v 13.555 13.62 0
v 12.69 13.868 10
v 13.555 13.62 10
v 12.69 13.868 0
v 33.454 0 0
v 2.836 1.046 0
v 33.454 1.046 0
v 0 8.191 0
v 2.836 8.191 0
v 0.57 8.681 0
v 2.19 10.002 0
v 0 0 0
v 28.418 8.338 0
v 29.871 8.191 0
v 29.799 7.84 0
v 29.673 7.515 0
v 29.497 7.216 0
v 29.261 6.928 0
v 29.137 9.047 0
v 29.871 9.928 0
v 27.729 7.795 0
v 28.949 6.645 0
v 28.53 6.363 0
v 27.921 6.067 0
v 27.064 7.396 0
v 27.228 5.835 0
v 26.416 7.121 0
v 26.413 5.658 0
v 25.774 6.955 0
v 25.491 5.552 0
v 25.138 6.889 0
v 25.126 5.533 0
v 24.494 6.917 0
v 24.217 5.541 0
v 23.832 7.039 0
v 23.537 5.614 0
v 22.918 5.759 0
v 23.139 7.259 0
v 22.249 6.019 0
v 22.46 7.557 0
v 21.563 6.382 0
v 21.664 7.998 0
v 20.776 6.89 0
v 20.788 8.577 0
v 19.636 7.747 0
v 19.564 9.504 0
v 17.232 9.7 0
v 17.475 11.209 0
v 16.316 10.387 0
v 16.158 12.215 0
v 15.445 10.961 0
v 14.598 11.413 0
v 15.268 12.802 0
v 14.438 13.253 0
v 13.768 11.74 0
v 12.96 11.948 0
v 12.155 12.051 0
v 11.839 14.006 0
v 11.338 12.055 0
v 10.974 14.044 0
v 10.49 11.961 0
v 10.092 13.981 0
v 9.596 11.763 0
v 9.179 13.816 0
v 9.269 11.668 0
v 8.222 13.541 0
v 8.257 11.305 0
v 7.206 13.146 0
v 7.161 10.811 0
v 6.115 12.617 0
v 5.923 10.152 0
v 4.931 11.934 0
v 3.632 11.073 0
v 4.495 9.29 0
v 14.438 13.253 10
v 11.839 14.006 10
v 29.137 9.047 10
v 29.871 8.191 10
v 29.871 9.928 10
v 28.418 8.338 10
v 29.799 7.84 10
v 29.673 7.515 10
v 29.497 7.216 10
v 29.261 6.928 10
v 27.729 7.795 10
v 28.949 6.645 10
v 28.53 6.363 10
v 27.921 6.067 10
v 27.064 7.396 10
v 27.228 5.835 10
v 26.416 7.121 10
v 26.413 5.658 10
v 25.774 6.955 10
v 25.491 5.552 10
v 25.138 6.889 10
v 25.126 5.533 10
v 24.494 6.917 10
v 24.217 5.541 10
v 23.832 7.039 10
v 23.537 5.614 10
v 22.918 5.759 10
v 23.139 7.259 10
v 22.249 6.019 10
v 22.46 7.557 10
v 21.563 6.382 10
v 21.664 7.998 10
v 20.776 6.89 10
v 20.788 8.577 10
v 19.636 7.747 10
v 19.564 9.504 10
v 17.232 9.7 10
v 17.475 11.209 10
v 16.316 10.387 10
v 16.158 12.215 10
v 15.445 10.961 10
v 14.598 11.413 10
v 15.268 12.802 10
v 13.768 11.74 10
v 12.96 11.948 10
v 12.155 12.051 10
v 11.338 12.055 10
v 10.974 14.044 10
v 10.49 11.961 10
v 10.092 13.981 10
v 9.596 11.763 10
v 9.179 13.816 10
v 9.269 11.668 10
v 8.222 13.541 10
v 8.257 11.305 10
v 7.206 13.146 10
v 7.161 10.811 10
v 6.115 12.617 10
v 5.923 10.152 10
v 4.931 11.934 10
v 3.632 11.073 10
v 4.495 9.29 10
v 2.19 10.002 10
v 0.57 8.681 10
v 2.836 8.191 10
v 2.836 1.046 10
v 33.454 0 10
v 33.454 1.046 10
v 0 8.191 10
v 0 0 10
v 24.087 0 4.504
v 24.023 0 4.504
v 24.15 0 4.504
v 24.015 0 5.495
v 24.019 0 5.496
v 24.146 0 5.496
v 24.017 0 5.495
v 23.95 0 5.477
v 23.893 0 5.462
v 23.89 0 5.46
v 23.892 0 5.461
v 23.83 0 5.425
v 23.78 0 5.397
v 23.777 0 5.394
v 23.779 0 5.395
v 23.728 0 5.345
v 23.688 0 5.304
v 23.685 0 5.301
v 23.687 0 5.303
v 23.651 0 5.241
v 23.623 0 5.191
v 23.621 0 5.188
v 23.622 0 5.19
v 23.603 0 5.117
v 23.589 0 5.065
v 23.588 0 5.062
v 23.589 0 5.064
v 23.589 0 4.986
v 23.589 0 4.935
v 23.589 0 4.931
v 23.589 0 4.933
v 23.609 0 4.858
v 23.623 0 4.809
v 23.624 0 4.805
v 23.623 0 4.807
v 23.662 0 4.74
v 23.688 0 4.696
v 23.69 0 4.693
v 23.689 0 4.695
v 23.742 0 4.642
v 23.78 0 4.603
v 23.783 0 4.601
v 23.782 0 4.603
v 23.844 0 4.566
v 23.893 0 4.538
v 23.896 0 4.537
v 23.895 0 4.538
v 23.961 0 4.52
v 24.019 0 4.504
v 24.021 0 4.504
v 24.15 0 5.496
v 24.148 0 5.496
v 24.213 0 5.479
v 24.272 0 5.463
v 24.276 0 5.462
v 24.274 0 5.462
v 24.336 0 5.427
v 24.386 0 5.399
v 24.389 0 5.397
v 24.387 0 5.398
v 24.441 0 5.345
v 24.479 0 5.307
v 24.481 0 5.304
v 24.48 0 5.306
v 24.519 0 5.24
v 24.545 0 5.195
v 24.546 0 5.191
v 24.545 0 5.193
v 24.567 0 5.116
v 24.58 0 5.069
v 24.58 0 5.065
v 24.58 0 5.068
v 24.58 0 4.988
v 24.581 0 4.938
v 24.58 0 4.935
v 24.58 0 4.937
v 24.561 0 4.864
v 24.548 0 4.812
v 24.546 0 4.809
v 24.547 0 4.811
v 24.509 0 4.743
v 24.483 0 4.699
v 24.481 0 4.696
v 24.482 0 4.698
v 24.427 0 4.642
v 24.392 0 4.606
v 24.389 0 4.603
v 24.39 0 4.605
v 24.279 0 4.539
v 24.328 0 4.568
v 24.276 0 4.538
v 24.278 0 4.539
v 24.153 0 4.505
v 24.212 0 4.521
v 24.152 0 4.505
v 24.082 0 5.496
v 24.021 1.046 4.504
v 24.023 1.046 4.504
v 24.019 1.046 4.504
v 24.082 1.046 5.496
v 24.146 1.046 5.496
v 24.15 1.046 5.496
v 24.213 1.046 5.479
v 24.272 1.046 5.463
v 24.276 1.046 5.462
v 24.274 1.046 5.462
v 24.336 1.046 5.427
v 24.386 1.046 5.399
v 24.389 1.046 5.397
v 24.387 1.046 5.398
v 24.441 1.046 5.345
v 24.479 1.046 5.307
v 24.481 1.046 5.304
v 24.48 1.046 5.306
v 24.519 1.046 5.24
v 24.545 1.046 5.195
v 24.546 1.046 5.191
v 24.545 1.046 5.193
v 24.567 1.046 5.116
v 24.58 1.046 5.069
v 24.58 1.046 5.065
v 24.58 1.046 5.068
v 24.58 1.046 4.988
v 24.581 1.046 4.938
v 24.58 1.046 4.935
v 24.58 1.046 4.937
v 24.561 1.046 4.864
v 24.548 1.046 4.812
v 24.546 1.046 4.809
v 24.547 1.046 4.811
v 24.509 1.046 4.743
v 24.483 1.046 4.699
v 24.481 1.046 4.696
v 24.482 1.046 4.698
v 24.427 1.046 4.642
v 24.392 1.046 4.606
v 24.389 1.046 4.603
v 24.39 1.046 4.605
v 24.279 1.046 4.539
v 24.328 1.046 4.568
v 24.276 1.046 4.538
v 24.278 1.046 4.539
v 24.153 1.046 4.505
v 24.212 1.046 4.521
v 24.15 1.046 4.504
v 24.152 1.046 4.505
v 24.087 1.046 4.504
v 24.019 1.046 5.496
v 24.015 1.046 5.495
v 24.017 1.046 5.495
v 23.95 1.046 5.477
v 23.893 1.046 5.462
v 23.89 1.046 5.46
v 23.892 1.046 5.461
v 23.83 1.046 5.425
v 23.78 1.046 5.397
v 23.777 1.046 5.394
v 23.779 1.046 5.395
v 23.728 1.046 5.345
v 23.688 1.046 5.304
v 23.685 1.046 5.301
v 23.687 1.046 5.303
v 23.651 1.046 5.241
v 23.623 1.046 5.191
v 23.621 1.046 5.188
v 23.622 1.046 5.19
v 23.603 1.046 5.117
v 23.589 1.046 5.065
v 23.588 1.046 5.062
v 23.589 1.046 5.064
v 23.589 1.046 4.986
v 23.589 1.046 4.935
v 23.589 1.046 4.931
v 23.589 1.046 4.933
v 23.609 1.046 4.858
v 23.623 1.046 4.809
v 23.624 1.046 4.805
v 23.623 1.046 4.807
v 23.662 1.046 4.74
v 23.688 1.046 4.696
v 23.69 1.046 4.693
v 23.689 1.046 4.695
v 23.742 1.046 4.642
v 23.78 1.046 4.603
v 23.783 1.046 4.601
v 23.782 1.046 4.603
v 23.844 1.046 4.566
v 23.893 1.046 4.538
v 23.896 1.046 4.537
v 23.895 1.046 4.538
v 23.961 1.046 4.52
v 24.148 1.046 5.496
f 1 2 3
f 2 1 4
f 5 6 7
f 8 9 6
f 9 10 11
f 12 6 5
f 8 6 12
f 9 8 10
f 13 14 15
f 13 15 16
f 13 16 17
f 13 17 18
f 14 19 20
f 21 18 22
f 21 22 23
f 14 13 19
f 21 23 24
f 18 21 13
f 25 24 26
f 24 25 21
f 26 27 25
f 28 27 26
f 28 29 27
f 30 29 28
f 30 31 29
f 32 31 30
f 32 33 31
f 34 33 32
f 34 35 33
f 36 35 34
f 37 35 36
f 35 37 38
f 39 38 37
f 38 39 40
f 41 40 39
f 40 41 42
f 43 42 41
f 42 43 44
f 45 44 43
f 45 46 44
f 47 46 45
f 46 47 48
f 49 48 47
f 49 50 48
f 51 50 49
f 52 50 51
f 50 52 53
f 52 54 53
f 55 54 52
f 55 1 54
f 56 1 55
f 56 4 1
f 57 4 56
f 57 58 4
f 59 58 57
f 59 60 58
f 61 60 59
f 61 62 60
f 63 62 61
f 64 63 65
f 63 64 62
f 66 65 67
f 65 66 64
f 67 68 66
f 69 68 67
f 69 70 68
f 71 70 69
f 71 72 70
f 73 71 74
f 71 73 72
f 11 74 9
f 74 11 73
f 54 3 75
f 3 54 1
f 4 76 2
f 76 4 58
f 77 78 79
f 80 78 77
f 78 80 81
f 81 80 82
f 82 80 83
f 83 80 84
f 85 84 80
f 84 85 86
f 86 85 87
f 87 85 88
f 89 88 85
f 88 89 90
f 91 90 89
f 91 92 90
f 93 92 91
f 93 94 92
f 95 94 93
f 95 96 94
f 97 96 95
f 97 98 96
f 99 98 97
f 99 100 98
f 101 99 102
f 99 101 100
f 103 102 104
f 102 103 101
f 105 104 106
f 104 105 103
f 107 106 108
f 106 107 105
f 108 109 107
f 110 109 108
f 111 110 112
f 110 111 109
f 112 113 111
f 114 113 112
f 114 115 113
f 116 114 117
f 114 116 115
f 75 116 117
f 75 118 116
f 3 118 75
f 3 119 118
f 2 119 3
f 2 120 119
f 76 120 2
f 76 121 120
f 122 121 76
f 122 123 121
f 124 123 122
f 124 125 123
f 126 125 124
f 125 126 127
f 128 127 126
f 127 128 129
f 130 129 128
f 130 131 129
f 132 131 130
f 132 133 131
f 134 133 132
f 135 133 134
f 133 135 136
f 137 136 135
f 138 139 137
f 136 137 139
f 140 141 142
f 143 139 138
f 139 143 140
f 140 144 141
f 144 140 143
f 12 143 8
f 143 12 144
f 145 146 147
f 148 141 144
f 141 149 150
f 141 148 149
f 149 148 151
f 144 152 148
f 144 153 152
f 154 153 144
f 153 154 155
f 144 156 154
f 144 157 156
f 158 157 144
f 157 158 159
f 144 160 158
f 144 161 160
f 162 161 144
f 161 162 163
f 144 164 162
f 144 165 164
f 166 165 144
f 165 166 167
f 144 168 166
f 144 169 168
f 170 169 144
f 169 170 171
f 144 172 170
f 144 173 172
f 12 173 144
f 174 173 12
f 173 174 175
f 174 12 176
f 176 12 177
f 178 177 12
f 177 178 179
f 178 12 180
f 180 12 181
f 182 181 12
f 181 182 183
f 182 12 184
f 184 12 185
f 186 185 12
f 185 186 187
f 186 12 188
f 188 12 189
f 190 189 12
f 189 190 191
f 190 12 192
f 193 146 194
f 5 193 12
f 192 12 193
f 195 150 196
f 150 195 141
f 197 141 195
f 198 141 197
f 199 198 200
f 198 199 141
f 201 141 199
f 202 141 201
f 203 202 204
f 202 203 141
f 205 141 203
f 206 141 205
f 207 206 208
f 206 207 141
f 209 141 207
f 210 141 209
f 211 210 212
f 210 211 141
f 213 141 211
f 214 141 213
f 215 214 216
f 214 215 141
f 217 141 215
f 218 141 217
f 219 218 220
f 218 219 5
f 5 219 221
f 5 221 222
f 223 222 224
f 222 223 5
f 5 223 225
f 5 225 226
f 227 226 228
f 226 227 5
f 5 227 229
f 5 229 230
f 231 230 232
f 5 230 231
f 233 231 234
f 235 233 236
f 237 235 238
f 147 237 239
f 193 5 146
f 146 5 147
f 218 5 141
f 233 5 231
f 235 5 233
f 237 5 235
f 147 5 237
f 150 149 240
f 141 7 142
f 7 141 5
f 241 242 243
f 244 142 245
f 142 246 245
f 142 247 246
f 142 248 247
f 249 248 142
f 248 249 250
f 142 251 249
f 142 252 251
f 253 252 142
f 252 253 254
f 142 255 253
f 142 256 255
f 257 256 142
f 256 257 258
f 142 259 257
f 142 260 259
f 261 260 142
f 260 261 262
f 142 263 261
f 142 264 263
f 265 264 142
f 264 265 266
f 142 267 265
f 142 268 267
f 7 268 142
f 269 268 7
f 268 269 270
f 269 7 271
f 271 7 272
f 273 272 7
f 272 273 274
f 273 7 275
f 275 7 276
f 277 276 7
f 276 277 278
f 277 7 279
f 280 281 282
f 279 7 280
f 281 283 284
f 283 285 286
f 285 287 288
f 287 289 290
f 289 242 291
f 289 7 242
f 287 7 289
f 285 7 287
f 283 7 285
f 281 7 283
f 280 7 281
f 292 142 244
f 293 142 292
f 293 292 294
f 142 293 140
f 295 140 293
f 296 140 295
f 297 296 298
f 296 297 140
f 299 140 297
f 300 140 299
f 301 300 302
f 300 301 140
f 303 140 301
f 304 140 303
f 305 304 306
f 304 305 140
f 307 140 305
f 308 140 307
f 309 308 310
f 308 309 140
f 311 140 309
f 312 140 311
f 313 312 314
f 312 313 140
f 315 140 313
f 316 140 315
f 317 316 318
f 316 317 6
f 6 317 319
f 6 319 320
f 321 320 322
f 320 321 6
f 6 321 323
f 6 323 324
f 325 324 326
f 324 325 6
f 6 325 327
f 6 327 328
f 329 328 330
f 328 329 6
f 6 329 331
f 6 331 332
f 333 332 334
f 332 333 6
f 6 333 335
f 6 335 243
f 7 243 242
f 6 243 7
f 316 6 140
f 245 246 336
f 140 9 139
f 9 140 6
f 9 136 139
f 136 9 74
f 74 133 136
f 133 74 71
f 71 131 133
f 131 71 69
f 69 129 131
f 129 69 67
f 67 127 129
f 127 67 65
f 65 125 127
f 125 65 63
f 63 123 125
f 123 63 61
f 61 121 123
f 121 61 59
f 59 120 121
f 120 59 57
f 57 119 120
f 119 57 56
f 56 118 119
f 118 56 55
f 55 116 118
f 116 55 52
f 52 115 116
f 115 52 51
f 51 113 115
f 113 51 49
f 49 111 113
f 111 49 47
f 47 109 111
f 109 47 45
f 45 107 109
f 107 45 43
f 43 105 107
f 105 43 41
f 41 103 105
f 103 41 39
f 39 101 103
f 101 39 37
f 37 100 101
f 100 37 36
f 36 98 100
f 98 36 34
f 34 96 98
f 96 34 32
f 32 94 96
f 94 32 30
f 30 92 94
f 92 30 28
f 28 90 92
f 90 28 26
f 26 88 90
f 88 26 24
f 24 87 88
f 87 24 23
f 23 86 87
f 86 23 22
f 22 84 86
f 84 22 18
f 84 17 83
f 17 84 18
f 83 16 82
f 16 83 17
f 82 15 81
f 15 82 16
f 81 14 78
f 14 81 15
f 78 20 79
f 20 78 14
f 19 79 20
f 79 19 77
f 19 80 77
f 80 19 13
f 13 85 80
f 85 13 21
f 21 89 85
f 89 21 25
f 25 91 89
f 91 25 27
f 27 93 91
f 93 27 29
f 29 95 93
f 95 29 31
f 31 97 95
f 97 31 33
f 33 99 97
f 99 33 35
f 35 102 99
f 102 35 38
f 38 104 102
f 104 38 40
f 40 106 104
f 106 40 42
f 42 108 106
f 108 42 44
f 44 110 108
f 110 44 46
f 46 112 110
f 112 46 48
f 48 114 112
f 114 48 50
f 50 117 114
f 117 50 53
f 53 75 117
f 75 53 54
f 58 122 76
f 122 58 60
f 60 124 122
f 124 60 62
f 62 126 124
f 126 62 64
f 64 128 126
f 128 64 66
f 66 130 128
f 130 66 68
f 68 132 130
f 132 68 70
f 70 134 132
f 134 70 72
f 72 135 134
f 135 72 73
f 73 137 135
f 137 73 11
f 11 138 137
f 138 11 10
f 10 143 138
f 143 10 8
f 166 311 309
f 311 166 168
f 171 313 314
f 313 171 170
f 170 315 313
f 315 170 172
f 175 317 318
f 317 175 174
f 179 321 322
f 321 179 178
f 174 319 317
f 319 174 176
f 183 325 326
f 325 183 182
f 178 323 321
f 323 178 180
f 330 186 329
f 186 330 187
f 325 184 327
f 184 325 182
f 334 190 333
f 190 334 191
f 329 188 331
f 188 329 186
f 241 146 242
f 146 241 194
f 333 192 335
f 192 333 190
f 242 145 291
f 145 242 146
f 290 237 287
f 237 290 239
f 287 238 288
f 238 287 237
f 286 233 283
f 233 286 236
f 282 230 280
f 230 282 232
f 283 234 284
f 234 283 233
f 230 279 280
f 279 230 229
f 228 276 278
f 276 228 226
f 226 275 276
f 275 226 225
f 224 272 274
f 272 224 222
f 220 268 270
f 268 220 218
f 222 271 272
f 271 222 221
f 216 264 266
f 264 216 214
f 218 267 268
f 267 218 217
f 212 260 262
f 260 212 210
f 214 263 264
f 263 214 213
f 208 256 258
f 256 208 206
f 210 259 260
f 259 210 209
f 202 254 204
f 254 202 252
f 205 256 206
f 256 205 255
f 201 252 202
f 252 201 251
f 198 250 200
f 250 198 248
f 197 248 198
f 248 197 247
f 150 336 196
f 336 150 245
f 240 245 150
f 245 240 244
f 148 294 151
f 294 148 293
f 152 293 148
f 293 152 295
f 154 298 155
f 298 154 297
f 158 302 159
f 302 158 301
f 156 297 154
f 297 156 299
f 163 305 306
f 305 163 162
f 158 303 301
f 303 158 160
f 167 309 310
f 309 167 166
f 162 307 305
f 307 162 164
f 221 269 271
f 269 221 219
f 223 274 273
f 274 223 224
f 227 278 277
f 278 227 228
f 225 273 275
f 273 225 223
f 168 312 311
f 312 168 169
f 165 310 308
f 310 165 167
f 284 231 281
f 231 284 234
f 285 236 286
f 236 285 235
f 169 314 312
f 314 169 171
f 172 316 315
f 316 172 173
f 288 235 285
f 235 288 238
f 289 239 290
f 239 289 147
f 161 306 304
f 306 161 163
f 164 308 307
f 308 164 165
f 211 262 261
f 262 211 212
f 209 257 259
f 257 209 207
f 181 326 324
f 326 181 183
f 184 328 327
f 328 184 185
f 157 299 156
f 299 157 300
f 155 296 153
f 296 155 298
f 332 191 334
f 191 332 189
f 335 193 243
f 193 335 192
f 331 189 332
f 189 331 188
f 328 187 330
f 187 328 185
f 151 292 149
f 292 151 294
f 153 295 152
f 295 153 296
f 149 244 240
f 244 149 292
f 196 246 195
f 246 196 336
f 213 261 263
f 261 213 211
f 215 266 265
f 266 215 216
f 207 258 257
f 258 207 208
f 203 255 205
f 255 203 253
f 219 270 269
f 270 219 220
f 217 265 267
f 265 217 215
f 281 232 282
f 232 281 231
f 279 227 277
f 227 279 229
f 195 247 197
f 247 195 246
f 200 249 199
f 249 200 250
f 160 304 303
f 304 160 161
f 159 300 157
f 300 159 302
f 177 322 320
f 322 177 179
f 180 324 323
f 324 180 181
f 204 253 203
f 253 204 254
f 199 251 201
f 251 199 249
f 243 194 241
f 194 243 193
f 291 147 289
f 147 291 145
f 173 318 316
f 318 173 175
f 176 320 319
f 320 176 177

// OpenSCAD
// preview[view:south east, tilt:top diagonal]



/* [Config] */

// New hole diameter.
holeDiameter = 1.0; // [1:0.01:10]



/* [Hidden] */

// Original hole dimensions, position.
350ClipHoleWidth = 1;
350ClipHoleDepth = 1.05;
350ClipHoleX = 23.5845 + 350ClipHoleWidth/2;
350ClipHoleZ = 5;

// This number of fragments should match number of fragments used in 350Clip.
$fn = 24;



/* Modules */

// The 350Clip zeroed to [0, 0, 0]. This clip does not necessarily magnify 350x.
module clip() {
    // zero the original 350Clip
    translate([0, -1.9, 0])
        350Clip();
}

// This drills bigger hole to the clip. The cylinder center is aligned with the hole.
module hole() {
    // center new hole
    translate([350ClipHoleX, 0, 350ClipHoleZ])
        // align cylinder sides with hole sides
        rotate([-90, 360/$fn/2, 0])
            cylinder(h=350ClipHoleDepth, d=holeDiameter, $fn=$fn);
}



/* Runtime */

difference() {
	clip();
    hole();
}










/* External dependencies */

// This is original PNNL 350x clip downloaded from https://availabletechnologies.pnnl.gov/technology.asp?id=393.
// It was converted from STL to OFF and then to polyhedron() function call.

// converted from 350Clip.off with off2polyhedron.sh

350ClipPoints = [
	[13.5553, 15.5202, 0],
	[14.4385, 15.1531, 0],
	[13.5553, 15.5202, 10],
	[14.4385, 15.1531, 10],
	[28.4185, 10.238, 0],
	[28.4185, 10.238, 10],
	[27.7291, 9.69549, 0],
	[27.7291, 9.69549, 10],
	[25.1381, 8.78909, 0],
	[25.1381, 8.78909, 10],
	[24.4945, 8.81721, 0],
	[24.4945, 8.81721, 10],
	[10.9744, 15.9441, 0],
	[11.8386, 15.9064, 0],
	[10.9744, 15.9441, 10],
	[11.8386, 15.9064, 10],
	[2.83636, 2.94568, 0],
	[2.83636, 2.94568, 10],
	[2.83636, 10.0912, 0],
	[2.83636, 10.0912, 10],
	[9.17896, 15.7158, 0],
	[10.092, 15.8814, 0],
	[9.17896, 15.7158, 10],
	[10.092, 15.8814, 10],
	[0, 10.0912, 10],
	[0, 1.9, 10],
	[33.4544, 1.9, 10],
	[0.570274, 10.5813, 10],
	[2.18979, 11.902, 10],
	[33.4544, 2.94568, 10],
	[3.63184, 12.9728, 10],
	[4.49487, 11.1899, 10],
	[4.93128, 13.834, 10],
	[5.92341, 12.0525, 10],
	[6.11531, 14.517, 10],
	[7.16066, 12.7113, 10],
	[7.20597, 15.0462, 10],
	[8.25718, 13.2054, 10],
	[8.2218, 15.4409, 10],
	[9.26933, 13.5682, 10],
	[9.59615, 13.6633, 10],
	[10.4905, 13.8611, 10],
	[11.3376, 13.9555, 10],
	[12.1553, 13.9514, 10],
	[12.6903, 15.7679, 10],
	[12.9601, 13.8483, 10],
	[13.7677, 13.6402, 10],
	[14.5977, 13.3134, 10],
	[15.2685, 14.7022, 10],
	[15.4453, 12.8609, 10],
	[16.1576, 14.1154, 10],
	[16.3164, 12.287, 10],
	[17.4753, 13.1091, 10],
	[17.2318, 11.5998, 10],
	[19.6365, 9.64675, 10],
	[19.5638, 11.4044, 10],
	[20.7885, 10.4768, 10],
	[20.7761, 8.79049, 10],
	[21.5628, 8.28176, 10],
	[21.6645, 9.89807, 10],
	[22.2488, 7.919, 10],
	[22.4605, 9.45734, 10],
	[22.9185, 7.65884, 10],
	[23.1394, 9.15905, 10],
	[23.5373, 7.51355, 10],
	[23.8321, 8.93904, 10],
	[24.2169, 7.44071, 10],
	[25.1265, 7.43294, 10],
	[25.4914, 7.45155, 10],
	[25.7737, 8.85492, 10],
	[26.4134, 7.55789, 10],
	[26.4159, 9.0215, 10],
	[27.2279, 7.73477, 10],
	[27.0636, 9.29644, 10],
	[27.9215, 7.96715, 10],
	[28.5303, 8.26265, 10],
	[29.137, 10.9474, 10],
	[28.9491, 8.54528, 10],
	[29.2615, 8.8284, 10],
	[29.8712, 11.8277, 10],
	[29.4969, 9.11571, 10],
	[29.673, 9.41528, 10],
	[29.7988, 9.7399, 10],
	[29.8712, 10.0912, 10],
	[24.0154, 2.94568, 5.49522],
	[24.0154, 1.9, 5.49522],
	[24.146, 2.94568, 5.4962],
	[24.146, 1.9, 5.4962],
	[8.25718, 13.2054, 0],
	[7.16066, 12.7113, 0],
	[29.2615, 8.8284, 0],
	[28.9491, 8.54528, 0],
	[24.2792, 1.9, 4.5395],
	[24.2792, 2.94568, 4.5395],
	[24.3917, 1.9, 4.60561],
	[24.3917, 2.94568, 4.60561],
	[29.7988, 9.7399, 0],
	[29.8712, 10.0912, 0],
	[7.20597, 15.0462, 0],
	[8.2218, 15.4409, 0],
	[16.3164, 12.287, 0],
	[15.4453, 12.8609, 0],
	[26.4134, 7.55789, 0],
	[27.2279, 7.73477, 0],
	[24.5478, 1.9, 4.81211],
	[24.4833, 1.9, 4.69859],
	[24.5478, 2.94568, 4.81211],
	[24.4833, 2.94568, 4.69859],
	[29.137, 10.9474, 0],
	[29.8712, 11.8277, 0],
	[22.4605, 9.45734, 0],
	[23.1394, 9.15905, 0],
	[23.783, 2.94568, 4.60106],
	[23.8965, 2.94568, 4.53664],
	[23.783, 1.9, 4.60106],
	[23.8965, 1.9, 4.53664],
	[33.4544, 1.9, 0],
	[33.4544, 2.94568, 0],
	[9.26933, 13.5682, 0],
	[2.18979, 11.902, 0],
	[3.63184, 12.9728, 0],
	[4.49487, 11.1899, 0],
	[4.93128, 13.834, 0],
	[5.92341, 12.0525, 0],
	[6.11531, 14.517, 0],
	[9.59615, 13.6633, 0],
	[10.4905, 13.8611, 0],
	[11.3376, 13.9555, 0],
	[12.1553, 13.9514, 0],
	[12.6903, 15.7679, 0],
	[12.9601, 13.8483, 0],
	[13.7677, 13.6402, 0],
	[14.5977, 13.3134, 0],
	[15.2685, 14.7022, 0],
	[16.1576, 14.1154, 0],
	[17.4753, 13.1091, 0],
	[17.2318, 11.5998, 0],
	[19.6365, 9.64675, 0],
	[19.5638, 11.4044, 0],
	[20.7885, 10.4768, 0],
	[20.7761, 8.79049, 0],
	[21.5628, 8.28176, 0],
	[21.6645, 9.89807, 0],
	[22.2488, 7.919, 0],
	[22.9185, 7.65884, 0],
	[23.5373, 7.51355, 0],
	[23.8321, 8.93904, 0],
	[24.2169, 7.44071, 0],
	[25.1265, 7.43294, 0],
	[25.4914, 7.45155, 0],
	[25.7737, 8.85492, 0],
	[26.4159, 9.0215, 0],
	[27.0636, 9.29644, 0],
	[27.9215, 7.96715, 0],
	[28.5303, 8.26265, 0],
	[29.4969, 9.11571, 0],
	[29.673, 9.41528, 0],
	[0, 10.0912, 0],
	[0, 1.9, 0],
	[0.570274, 10.5813, 0],
	[24.0229, 1.9, 4.5038],
	[24.0229, 2.94568, 4.5038],
	[24.3858, 1.9, 5.39894],
	[24.4788, 1.9, 5.30733],
	[24.3858, 2.94568, 5.39894],
	[24.4788, 2.94568, 5.30733],
	[23.5882, 1.9, 5.06156],
	[23.6211, 1.9, 5.18789],
	[23.5882, 2.94568, 5.06156],
	[23.6211, 2.94568, 5.18789],
	[24.5449, 1.9, 5.19478],
	[24.5796, 1.9, 5.06896],
	[24.5449, 2.94568, 5.19478],
	[24.5796, 2.94568, 5.06896],
	[23.6239, 1.9, 4.80521],
	[23.5892, 1.9, 4.93104],
	[23.6239, 2.94568, 4.80521],
	[23.5892, 2.94568, 4.93104],
	[23.69, 1.9, 4.69267],
	[23.69, 2.94568, 4.69267],
	[24.5806, 1.9, 4.93844],
	[24.5806, 2.94568, 4.93844],
	[24.1534, 1.9, 4.50478],
	[24.2723, 1.9, 5.46336],
	[23.6855, 1.9, 5.30141],
	[23.7771, 1.9, 5.39439],
	[23.8896, 1.9, 5.4605],
	[24.1534, 2.94568, 4.50478],
	[23.6855, 2.94568, 5.30141],
	[23.7771, 2.94568, 5.39439],
	[23.8896, 2.94568, 5.4605],
	[24.2723, 2.94568, 5.46336],
];

350ClipFaces = [
	[129, 2, 44],
	[0, 2, 129],
	[158, 159, 157],
	[119, 159, 158],
	[120, 119, 158],
	[122, 120, 18],
	[124, 122, 121],
	[99, 98, 123],
	[20, 99, 89],
	[12, 21, 88],
	[13, 12, 125],
	[129, 13, 126],
	[0, 129, 127],
	[1, 0, 130],
	[133, 1, 131],
	[134, 133, 132],
	[135, 134, 101],
	[138, 135, 136],
	[139, 138, 136],
	[110, 142, 137],
	[141, 111, 140],
	[10, 146, 141],
	[8, 10, 141],
	[151, 97, 152],
	[152, 97, 6],
	[6, 97, 4],
	[97, 109, 108],
	[4, 97, 108],
	[96, 97, 151],
	[143, 8, 141],
	[155, 156, 144],
	[90, 155, 145],
	[154, 91, 147],
	[153, 154, 149],
	[149, 154, 148],
	[148, 154, 147],
	[147, 91, 145],
	[156, 96, 143],
	[91, 90, 145],
	[96, 151, 143],
	[145, 155, 144],
	[151, 150, 143],
	[143, 150, 8],
	[16, 158, 117],
	[141, 146, 111],
	[140, 110, 137],
	[140, 111, 110],
	[137, 142, 139],
	[136, 135, 100],
	[100, 135, 101],
	[101, 134, 132],
	[132, 133, 131],
	[131, 1, 130],
	[130, 0, 128],
	[128, 0, 127],
	[127, 129, 126],
	[126, 13, 125],
	[125, 12, 118],
	[118, 12, 88],
	[88, 21, 89],
	[21, 20, 89],
	[123, 98, 121],
	[89, 99, 123],
	[98, 124, 121],
	[121, 122, 18],
	[18, 120, 158],
	[18, 158, 16],
	[137, 139, 136],
	[116, 117, 158],
	[103, 153, 149],
	[102, 103, 149],
	[144, 156, 143],
	[0, 3, 2],
	[1, 3, 0],
	[13, 44, 15],
	[129, 44, 13],
	[29, 26, 25],
	[17, 25, 19],
	[29, 25, 17],
	[19, 25, 30],
	[31, 19, 14],
	[33, 31, 15],
	[35, 33, 44],
	[37, 35, 44],
	[39, 37, 2],
	[58, 64, 62],
	[40, 39, 3],
	[41, 40, 3],
	[64, 58, 57],
	[42, 41, 48],
	[81, 7, 5],
	[43, 42, 50],
	[78, 73, 7],
	[82, 81, 5],
	[74, 9, 69],
	[43, 50, 45],
	[47, 59, 61],
	[57, 54, 64],
	[62, 60, 58],
	[49, 68, 67],
	[54, 66, 64],
	[53, 67, 66],
	[68, 49, 61],
	[47, 56, 59],
	[72, 11, 9],
	[70, 61, 63],
	[47, 55, 56],
	[77, 75, 73],
	[80, 78, 7],
	[75, 71, 73],
	[83, 76, 79],
	[82, 5, 83],
	[45, 50, 52],
	[80, 7, 81],
	[77, 73, 78],
	[74, 71, 75],
	[74, 69, 71],
	[72, 9, 74],
	[70, 11, 72],
	[49, 47, 61],
	[70, 65, 11],
	[70, 63, 65],
	[68, 61, 70],
	[50, 42, 48],
	[48, 41, 3],
	[3, 39, 2],
	[2, 37, 44],
	[44, 33, 15],
	[15, 31, 14],
	[14, 19, 23],
	[23, 19, 22],
	[22, 19, 38],
	[38, 19, 36],
	[36, 19, 34],
	[34, 19, 32],
	[32, 19, 30],
	[30, 25, 28],
	[28, 25, 27],
	[27, 25, 24],
	[83, 5, 76],
	[67, 53, 51],
	[51, 49, 67],
	[66, 54, 53],
	[47, 46, 55],
	[45, 52, 46],
	[46, 52, 55],
	[158, 24, 25],
	[157, 24, 158],
	[26, 116, 162],
	[26, 158, 25],
	[116, 94, 105],
	[26, 162, 183],
	[167, 166, 158],
	[26, 183, 87],
	[184, 167, 158],
	[26, 87, 85],
	[185, 184, 158],
	[26, 186, 158],
	[186, 185, 158],
	[162, 116, 163],
	[163, 116, 170],
	[170, 116, 171],
	[171, 116, 180],
	[180, 116, 104],
	[104, 116, 105],
	[158, 160, 182],
	[94, 116, 92],
	[92, 116, 182],
	[158, 115, 160],
	[182, 116, 158],
	[114, 115, 158],
	[178, 114, 158],
	[174, 178, 158],
	[166, 175, 158],
	[175, 174, 158],
	[26, 85, 186],
	[29, 117, 116],
	[29, 116, 26],
	[16, 29, 17],
	[117, 29, 107],
	[190, 16, 189],
	[177, 168, 16],
	[176, 177, 16],
	[179, 176, 16],
	[112, 179, 16],
	[113, 112, 16],
	[117, 113, 16],
	[161, 117, 187],
	[187, 117, 93],
	[93, 117, 95],
	[95, 117, 107],
	[107, 29, 106],
	[164, 29, 191],
	[106, 29, 181],
	[181, 29, 173],
	[173, 29, 172],
	[172, 29, 165],
	[165, 29, 164],
	[191, 29, 86],
	[86, 29, 84],
	[84, 29, 16],
	[190, 84, 16],
	[189, 16, 188],
	[169, 188, 16],
	[168, 169, 16],
	[113, 117, 161],
	[19, 18, 16],
	[19, 16, 17],
	[31, 121, 18],
	[31, 18, 19],
	[33, 123, 121],
	[33, 121, 31],
	[35, 89, 123],
	[35, 123, 33],
	[37, 88, 89],
	[37, 89, 35],
	[39, 118, 88],
	[39, 88, 37],
	[40, 125, 118],
	[40, 118, 39],
	[41, 126, 125],
	[41, 125, 40],
	[42, 127, 126],
	[42, 126, 41],
	[43, 128, 127],
	[43, 127, 42],
	[45, 130, 128],
	[45, 128, 43],
	[46, 131, 130],
	[46, 130, 45],
	[47, 132, 131],
	[47, 131, 46],
	[49, 101, 132],
	[49, 132, 47],
	[51, 100, 101],
	[51, 101, 49],
	[53, 136, 100],
	[53, 100, 51],
	[54, 137, 136],
	[54, 136, 53],
	[57, 140, 137],
	[57, 137, 54],
	[58, 141, 140],
	[58, 140, 57],
	[60, 143, 141],
	[60, 141, 58],
	[62, 144, 143],
	[62, 143, 60],
	[64, 145, 144],
	[64, 144, 62],
	[66, 147, 145],
	[66, 145, 64],
	[67, 148, 147],
	[67, 147, 66],
	[68, 149, 148],
	[68, 148, 67],
	[70, 102, 149],
	[70, 149, 68],
	[72, 103, 102],
	[72, 102, 70],
	[74, 153, 103],
	[74, 103, 72],
	[75, 154, 153],
	[75, 153, 74],
	[77, 91, 154],
	[77, 154, 75],
	[78, 90, 91],
	[78, 91, 77],
	[80, 155, 90],
	[80, 90, 78],
	[81, 156, 155],
	[81, 155, 80],
	[82, 96, 156],
	[82, 156, 81],
	[83, 97, 96],
	[83, 96, 82],
	[79, 109, 97],
	[79, 97, 83],
	[108, 79, 76],
	[109, 79, 108],
	[4, 76, 5],
	[108, 76, 4],
	[6, 5, 7],
	[4, 5, 6],
	[152, 7, 73],
	[6, 7, 152],
	[151, 73, 71],
	[152, 73, 151],
	[150, 71, 69],
	[151, 71, 150],
	[8, 69, 9],
	[150, 69, 8],
	[10, 9, 11],
	[8, 9, 10],
	[146, 11, 65],
	[10, 11, 146],
	[111, 65, 63],
	[146, 65, 111],
	[110, 63, 61],
	[111, 63, 110],
	[142, 61, 59],
	[110, 61, 142],
	[139, 59, 56],
	[142, 59, 139],
	[138, 56, 55],
	[139, 56, 138],
	[135, 55, 52],
	[138, 55, 135],
	[134, 52, 50],
	[135, 52, 134],
	[133, 50, 48],
	[134, 50, 133],
	[1, 48, 3],
	[133, 48, 1],
	[12, 15, 14],
	[13, 15, 12],
	[21, 14, 23],
	[12, 14, 21],
	[20, 23, 22],
	[21, 23, 20],
	[99, 22, 38],
	[20, 22, 99],
	[98, 38, 36],
	[99, 38, 98],
	[124, 36, 34],
	[98, 36, 124],
	[122, 34, 32],
	[124, 34, 122],
	[120, 32, 30],
	[122, 32, 120],
	[119, 30, 28],
	[120, 30, 119],
	[159, 28, 27],
	[119, 28, 159],
	[157, 27, 24],
	[159, 27, 157],
	[169, 168, 166],
	[169, 166, 167],
	[177, 175, 166],
	[177, 166, 168],
	[176, 174, 175],
	[176, 175, 177],
	[179, 178, 174],
	[179, 174, 176],
	[112, 114, 178],
	[112, 178, 179],
	[113, 115, 114],
	[113, 114, 112],
	[161, 160, 115],
	[161, 115, 113],
	[187, 182, 160],
	[187, 160, 161],
	[93, 92, 182],
	[93, 182, 187],
	[95, 94, 92],
	[95, 92, 93],
	[94, 107, 105],
	[95, 107, 94],
	[105, 106, 104],
	[107, 106, 105],
	[104, 181, 180],
	[106, 181, 104],
	[171, 181, 173],
	[180, 181, 171],
	[170, 173, 172],
	[171, 173, 170],
	[163, 172, 165],
	[170, 172, 163],
	[162, 165, 164],
	[163, 165, 162],
	[183, 164, 191],
	[162, 164, 183],
	[87, 191, 86],
	[183, 191, 87],
	[85, 86, 84],
	[87, 86, 85],
	[186, 84, 190],
	[85, 84, 186],
	[185, 190, 189],
	[186, 190, 185],
	[189, 188, 184],
	[189, 184, 185],
	[188, 169, 167],
	[188, 167, 184],
];

module 350Clip() {
	polyhedron(points = 350ClipPoints, faces = 350ClipFaces, convexity = 4);
}
